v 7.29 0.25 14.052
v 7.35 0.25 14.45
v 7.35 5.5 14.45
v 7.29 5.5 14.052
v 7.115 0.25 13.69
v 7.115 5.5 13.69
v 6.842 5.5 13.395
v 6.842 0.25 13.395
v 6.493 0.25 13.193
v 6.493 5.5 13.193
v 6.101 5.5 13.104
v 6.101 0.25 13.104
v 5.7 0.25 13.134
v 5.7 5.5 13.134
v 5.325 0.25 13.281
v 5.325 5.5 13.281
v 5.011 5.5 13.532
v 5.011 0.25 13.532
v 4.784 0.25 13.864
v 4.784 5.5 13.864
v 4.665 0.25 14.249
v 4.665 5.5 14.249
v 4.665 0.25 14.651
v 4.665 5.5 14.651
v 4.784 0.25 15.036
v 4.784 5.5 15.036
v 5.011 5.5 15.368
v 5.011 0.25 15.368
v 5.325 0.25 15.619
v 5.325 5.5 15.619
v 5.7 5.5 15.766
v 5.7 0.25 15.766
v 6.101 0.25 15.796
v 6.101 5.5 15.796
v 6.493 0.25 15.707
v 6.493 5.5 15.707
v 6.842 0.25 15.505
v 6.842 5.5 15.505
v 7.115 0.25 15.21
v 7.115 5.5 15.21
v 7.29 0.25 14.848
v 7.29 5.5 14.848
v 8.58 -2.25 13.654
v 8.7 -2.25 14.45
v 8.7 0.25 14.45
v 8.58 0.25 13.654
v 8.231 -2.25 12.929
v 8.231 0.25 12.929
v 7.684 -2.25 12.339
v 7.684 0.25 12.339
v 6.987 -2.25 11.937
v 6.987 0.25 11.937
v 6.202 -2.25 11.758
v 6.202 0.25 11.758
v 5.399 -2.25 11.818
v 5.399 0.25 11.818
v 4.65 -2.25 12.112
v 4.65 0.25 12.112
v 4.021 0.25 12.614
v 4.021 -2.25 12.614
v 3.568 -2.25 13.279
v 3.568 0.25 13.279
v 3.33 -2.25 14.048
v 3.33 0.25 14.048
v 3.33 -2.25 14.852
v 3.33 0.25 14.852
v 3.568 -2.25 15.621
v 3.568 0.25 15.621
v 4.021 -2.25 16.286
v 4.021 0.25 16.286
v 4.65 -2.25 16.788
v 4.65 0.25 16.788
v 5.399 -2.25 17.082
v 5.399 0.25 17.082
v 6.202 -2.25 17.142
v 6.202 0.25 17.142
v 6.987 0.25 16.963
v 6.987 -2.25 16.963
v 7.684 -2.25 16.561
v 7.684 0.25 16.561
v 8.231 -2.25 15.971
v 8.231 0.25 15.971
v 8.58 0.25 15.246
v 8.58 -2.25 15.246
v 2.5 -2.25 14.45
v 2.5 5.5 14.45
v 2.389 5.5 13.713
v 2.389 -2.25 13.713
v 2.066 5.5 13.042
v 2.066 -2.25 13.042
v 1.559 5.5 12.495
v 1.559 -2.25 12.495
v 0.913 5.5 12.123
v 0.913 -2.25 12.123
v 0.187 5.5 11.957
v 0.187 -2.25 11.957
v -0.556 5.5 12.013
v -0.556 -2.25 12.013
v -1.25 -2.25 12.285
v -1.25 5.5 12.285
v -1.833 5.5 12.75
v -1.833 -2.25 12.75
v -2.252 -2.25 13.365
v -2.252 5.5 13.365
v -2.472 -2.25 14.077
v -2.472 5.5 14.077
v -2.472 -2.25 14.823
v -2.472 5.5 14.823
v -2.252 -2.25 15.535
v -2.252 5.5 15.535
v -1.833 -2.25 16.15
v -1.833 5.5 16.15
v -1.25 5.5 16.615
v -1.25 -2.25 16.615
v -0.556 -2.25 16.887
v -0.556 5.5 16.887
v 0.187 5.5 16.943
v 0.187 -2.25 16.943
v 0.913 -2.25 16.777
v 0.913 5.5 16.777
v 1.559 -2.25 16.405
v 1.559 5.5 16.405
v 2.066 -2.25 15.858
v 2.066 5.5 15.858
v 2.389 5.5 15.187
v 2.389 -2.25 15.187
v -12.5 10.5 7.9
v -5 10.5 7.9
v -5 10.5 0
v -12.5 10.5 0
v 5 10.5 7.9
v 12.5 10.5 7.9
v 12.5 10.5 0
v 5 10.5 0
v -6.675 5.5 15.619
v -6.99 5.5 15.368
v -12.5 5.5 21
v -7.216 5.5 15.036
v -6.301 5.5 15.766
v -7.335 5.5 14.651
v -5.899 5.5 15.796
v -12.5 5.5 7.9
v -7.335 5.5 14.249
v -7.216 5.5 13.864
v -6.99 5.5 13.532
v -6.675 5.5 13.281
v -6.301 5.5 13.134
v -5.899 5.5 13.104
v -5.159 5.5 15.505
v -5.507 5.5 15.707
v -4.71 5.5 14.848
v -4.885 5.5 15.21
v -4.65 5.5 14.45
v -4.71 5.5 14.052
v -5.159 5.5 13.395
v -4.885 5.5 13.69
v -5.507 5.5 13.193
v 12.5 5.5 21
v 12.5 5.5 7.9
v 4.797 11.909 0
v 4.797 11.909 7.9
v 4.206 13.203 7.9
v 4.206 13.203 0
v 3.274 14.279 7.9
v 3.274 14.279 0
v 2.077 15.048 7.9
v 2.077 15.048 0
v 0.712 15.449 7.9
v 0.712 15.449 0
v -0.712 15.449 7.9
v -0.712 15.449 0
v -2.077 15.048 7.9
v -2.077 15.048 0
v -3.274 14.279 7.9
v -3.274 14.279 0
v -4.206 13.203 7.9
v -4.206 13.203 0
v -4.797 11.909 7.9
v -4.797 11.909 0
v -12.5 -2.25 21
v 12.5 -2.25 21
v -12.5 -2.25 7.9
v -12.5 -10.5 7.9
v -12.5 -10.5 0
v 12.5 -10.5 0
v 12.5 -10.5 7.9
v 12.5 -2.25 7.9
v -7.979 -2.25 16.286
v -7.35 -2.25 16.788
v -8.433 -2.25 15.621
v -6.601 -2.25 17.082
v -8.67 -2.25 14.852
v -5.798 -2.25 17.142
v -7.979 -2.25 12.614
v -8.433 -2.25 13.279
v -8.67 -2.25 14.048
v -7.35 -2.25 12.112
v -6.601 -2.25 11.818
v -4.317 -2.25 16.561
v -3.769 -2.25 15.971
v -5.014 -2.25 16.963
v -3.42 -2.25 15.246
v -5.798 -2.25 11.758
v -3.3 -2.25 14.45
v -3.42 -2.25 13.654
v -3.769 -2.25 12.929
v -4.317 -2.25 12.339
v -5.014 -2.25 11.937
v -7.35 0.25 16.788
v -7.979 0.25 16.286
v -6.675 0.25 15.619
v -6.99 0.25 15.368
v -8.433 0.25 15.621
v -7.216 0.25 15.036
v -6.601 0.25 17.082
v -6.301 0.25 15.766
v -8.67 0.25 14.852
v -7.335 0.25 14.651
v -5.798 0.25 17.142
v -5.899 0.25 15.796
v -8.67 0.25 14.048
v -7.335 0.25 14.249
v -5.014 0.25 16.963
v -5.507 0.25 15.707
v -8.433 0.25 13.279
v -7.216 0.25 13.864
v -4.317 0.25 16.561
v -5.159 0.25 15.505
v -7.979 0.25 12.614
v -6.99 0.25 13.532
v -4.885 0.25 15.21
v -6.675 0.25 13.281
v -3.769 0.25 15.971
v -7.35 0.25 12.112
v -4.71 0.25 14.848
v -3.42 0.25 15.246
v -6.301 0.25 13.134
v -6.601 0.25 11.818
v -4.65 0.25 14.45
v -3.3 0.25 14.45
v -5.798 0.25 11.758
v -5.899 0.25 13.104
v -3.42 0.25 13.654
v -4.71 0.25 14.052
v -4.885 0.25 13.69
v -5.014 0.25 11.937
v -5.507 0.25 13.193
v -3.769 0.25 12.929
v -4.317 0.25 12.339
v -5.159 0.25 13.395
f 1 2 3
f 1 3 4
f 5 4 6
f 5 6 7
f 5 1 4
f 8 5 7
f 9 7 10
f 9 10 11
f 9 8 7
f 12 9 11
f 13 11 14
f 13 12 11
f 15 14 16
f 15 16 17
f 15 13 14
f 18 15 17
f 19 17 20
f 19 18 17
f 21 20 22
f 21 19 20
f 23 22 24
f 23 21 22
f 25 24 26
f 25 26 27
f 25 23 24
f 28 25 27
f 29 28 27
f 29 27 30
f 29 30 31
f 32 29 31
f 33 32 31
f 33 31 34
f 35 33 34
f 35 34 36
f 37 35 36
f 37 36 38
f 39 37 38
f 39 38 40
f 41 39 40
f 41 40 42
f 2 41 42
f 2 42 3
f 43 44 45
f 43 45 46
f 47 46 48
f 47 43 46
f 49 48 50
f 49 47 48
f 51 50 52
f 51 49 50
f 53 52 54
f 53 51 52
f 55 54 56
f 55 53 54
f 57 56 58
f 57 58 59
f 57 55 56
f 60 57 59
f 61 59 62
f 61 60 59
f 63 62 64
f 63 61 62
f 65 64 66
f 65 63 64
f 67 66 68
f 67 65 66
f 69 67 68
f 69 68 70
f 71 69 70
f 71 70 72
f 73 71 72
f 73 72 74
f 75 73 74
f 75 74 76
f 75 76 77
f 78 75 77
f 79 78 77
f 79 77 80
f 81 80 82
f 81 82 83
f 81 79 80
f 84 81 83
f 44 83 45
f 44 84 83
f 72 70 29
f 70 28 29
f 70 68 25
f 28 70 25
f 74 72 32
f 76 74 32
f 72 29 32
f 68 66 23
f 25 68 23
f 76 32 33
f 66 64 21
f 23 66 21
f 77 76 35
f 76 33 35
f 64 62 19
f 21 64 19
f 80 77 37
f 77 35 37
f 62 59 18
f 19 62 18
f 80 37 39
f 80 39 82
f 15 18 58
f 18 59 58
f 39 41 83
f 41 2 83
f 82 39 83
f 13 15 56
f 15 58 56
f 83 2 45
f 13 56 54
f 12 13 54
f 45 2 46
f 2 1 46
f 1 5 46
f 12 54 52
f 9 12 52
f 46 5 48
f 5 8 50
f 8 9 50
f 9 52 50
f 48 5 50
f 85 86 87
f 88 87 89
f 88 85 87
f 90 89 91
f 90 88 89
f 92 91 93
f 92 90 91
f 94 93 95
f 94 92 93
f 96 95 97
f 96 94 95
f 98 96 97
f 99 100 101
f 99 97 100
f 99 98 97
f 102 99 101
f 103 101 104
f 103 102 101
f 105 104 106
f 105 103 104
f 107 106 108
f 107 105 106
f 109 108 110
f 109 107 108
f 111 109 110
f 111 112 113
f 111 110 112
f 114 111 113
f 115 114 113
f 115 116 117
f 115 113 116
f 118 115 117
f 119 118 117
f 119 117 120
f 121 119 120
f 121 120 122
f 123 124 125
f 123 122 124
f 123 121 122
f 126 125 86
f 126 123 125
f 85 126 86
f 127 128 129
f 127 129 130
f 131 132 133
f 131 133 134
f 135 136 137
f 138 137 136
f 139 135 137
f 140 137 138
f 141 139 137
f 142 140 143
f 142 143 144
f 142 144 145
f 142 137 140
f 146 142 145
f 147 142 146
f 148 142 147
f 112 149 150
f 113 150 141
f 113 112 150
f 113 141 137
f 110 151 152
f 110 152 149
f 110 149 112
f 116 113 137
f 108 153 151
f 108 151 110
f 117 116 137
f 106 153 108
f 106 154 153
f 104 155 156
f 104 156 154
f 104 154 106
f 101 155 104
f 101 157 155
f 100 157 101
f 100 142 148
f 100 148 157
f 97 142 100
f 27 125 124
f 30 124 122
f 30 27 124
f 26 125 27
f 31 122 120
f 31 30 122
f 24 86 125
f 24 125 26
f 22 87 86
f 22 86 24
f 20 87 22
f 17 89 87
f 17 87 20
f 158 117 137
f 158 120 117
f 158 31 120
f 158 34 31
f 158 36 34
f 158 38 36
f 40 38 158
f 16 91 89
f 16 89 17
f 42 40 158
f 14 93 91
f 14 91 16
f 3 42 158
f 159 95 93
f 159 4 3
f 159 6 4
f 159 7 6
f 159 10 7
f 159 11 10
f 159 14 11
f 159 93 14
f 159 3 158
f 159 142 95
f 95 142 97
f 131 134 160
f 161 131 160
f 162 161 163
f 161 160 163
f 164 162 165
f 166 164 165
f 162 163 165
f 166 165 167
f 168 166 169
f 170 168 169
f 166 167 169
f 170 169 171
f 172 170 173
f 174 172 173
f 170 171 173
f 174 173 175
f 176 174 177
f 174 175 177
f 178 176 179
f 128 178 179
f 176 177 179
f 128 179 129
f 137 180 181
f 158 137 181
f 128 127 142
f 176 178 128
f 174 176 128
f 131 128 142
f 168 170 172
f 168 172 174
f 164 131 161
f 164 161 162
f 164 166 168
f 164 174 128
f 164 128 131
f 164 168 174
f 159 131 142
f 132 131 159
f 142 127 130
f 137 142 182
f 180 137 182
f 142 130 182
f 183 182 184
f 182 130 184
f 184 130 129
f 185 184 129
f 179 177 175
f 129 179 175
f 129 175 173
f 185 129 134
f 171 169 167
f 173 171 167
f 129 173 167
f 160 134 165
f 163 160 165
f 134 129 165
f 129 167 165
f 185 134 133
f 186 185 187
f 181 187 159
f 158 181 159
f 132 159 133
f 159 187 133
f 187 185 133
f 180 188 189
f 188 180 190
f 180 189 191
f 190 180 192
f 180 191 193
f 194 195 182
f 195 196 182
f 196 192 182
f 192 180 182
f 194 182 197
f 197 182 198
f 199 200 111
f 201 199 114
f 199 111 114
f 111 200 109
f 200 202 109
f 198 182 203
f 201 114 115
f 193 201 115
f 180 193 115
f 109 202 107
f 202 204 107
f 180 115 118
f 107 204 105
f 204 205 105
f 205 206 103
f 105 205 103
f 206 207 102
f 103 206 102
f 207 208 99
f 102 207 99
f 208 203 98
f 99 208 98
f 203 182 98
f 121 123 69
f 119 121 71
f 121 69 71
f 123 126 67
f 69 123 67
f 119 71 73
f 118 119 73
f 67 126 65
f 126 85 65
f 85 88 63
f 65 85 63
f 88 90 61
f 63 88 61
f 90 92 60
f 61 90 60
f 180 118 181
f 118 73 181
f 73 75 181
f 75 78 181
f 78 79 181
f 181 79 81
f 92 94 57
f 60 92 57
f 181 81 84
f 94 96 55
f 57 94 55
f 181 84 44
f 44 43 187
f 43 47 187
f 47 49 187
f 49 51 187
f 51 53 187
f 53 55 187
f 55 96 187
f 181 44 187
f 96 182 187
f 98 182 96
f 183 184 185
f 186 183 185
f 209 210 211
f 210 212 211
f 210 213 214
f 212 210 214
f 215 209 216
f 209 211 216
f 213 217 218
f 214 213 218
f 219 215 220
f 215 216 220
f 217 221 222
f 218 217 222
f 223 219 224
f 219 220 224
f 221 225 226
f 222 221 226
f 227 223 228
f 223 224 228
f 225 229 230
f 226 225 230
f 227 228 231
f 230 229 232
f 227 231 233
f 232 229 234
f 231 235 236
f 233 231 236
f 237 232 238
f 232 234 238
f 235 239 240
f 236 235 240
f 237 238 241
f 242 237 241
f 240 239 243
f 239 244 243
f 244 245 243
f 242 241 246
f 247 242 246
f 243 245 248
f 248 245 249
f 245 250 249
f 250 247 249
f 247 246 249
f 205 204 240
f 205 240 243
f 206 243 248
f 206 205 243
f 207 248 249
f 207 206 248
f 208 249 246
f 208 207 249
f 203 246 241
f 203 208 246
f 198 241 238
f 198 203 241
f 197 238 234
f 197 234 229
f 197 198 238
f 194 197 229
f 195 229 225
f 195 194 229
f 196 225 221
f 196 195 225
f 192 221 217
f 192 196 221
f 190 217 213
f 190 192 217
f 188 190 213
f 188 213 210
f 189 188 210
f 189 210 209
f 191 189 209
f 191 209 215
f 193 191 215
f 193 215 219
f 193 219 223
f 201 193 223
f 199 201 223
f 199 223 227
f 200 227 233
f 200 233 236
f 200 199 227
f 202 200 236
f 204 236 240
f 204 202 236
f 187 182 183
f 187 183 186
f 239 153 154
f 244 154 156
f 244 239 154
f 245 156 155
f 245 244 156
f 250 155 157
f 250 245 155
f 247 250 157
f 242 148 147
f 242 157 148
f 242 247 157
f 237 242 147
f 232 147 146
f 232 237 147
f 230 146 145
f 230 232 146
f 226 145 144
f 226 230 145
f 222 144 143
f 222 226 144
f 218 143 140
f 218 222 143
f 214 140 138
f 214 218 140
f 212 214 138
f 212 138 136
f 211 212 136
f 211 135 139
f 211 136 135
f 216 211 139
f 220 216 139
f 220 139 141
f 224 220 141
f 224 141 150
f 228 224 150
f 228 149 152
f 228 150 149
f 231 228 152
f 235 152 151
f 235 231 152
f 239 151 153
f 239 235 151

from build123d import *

# Parameters (mm, degrees)
BOSS_EXTRUDE1_DEPTH = 7.9
SKETCH2_W           = 25
SKETCH2_H           = 13.1
SKETCH2_R           = 1.349845
BOSS_EXTRUDE2_DEPTH = 7.75
SKETCH2_4_R         = 2.499995
SKETCH2_4_R_2       = 1.349845
CUT_EXTRUDE1_DEPTH  = 23.498
SKETCH2_6_R         = 2.6999438
SKETCH2_6_R_2       = 1.349845
CUT_EXTRUDE2_DEPTH  = 2.5


with BuildPart() as part:
    # Sketch1 → Boss-Extrude1 (new body)
    with BuildSketch(Plane.XY):
        with BuildLine():
            Line((-5, 10.5), (-12.5, 10.5))
            Line((-12.5, 10.5), (-12.5, -10.5))
            Line((-12.5, -10.5), (12.5, -10.5))
            Line((12.5, -10.5), (12.5, 10.5))
            Line((12.5, 10.5), (5, 10.5))
            ThreePointArc((5, 10.5), (0, 15.5), (-5, 10.5))
        make_face()
    extrude(amount=BOSS_EXTRUDE1_DEPTH)

    # Sketch2 → Boss-Extrude2 (add)
    with BuildSketch(Plane(origin=(0, -2.24999999, 0), x_dir=(1, 0, 0), z_dir=(0, 1, 0))):
        with Locations((0, -14.45)):
            Rectangle(SKETCH2_W, SKETCH2_H)
        with Locations((6.00015, -14.45)):
            Circle(SKETCH2_R, mode=Mode.SUBTRACT)
    extrude(amount=BOSS_EXTRUDE2_DEPTH)

    # Sketch2<4> → Cut-Extrude1 (cut)
    with BuildSketch(Plane(origin=(0, -2.24999999, 0), x_dir=(1, 0, 0), z_dir=(0, 1, 0))):
        with Locations((0, -14.45)):
            Circle(SKETCH2_4_R)
        with Locations((-6.00015, -14.45)):
            Circle(SKETCH2_4_R_2)
    extrude(amount=CUT_EXTRUDE1_DEPTH, mode=Mode.SUBTRACT)

    # Sketch2<6> → Cut-Extrude2 (cut)
    with BuildSketch(Plane(origin=(0, -2.24999999, 0), x_dir=(1, 0, 0), z_dir=(0, 1, 0))):
        with Locations((6.00015, -14.45)):
            Circle(SKETCH2_6_R)
        with Locations((6.00015, -14.45)):
            Circle(SKETCH2_6_R_2, mode=Mode.SUBTRACT)
        with Locations((-6.00015, -14.45)):
            Circle(SKETCH2_6_R)
        with Locations((-6.00015, -14.45)):
            Circle(SKETCH2_6_R_2, mode=Mode.SUBTRACT)
    extrude(amount=CUT_EXTRUDE2_DEPTH, mode=Mode.SUBTRACT)


solid = part.part
